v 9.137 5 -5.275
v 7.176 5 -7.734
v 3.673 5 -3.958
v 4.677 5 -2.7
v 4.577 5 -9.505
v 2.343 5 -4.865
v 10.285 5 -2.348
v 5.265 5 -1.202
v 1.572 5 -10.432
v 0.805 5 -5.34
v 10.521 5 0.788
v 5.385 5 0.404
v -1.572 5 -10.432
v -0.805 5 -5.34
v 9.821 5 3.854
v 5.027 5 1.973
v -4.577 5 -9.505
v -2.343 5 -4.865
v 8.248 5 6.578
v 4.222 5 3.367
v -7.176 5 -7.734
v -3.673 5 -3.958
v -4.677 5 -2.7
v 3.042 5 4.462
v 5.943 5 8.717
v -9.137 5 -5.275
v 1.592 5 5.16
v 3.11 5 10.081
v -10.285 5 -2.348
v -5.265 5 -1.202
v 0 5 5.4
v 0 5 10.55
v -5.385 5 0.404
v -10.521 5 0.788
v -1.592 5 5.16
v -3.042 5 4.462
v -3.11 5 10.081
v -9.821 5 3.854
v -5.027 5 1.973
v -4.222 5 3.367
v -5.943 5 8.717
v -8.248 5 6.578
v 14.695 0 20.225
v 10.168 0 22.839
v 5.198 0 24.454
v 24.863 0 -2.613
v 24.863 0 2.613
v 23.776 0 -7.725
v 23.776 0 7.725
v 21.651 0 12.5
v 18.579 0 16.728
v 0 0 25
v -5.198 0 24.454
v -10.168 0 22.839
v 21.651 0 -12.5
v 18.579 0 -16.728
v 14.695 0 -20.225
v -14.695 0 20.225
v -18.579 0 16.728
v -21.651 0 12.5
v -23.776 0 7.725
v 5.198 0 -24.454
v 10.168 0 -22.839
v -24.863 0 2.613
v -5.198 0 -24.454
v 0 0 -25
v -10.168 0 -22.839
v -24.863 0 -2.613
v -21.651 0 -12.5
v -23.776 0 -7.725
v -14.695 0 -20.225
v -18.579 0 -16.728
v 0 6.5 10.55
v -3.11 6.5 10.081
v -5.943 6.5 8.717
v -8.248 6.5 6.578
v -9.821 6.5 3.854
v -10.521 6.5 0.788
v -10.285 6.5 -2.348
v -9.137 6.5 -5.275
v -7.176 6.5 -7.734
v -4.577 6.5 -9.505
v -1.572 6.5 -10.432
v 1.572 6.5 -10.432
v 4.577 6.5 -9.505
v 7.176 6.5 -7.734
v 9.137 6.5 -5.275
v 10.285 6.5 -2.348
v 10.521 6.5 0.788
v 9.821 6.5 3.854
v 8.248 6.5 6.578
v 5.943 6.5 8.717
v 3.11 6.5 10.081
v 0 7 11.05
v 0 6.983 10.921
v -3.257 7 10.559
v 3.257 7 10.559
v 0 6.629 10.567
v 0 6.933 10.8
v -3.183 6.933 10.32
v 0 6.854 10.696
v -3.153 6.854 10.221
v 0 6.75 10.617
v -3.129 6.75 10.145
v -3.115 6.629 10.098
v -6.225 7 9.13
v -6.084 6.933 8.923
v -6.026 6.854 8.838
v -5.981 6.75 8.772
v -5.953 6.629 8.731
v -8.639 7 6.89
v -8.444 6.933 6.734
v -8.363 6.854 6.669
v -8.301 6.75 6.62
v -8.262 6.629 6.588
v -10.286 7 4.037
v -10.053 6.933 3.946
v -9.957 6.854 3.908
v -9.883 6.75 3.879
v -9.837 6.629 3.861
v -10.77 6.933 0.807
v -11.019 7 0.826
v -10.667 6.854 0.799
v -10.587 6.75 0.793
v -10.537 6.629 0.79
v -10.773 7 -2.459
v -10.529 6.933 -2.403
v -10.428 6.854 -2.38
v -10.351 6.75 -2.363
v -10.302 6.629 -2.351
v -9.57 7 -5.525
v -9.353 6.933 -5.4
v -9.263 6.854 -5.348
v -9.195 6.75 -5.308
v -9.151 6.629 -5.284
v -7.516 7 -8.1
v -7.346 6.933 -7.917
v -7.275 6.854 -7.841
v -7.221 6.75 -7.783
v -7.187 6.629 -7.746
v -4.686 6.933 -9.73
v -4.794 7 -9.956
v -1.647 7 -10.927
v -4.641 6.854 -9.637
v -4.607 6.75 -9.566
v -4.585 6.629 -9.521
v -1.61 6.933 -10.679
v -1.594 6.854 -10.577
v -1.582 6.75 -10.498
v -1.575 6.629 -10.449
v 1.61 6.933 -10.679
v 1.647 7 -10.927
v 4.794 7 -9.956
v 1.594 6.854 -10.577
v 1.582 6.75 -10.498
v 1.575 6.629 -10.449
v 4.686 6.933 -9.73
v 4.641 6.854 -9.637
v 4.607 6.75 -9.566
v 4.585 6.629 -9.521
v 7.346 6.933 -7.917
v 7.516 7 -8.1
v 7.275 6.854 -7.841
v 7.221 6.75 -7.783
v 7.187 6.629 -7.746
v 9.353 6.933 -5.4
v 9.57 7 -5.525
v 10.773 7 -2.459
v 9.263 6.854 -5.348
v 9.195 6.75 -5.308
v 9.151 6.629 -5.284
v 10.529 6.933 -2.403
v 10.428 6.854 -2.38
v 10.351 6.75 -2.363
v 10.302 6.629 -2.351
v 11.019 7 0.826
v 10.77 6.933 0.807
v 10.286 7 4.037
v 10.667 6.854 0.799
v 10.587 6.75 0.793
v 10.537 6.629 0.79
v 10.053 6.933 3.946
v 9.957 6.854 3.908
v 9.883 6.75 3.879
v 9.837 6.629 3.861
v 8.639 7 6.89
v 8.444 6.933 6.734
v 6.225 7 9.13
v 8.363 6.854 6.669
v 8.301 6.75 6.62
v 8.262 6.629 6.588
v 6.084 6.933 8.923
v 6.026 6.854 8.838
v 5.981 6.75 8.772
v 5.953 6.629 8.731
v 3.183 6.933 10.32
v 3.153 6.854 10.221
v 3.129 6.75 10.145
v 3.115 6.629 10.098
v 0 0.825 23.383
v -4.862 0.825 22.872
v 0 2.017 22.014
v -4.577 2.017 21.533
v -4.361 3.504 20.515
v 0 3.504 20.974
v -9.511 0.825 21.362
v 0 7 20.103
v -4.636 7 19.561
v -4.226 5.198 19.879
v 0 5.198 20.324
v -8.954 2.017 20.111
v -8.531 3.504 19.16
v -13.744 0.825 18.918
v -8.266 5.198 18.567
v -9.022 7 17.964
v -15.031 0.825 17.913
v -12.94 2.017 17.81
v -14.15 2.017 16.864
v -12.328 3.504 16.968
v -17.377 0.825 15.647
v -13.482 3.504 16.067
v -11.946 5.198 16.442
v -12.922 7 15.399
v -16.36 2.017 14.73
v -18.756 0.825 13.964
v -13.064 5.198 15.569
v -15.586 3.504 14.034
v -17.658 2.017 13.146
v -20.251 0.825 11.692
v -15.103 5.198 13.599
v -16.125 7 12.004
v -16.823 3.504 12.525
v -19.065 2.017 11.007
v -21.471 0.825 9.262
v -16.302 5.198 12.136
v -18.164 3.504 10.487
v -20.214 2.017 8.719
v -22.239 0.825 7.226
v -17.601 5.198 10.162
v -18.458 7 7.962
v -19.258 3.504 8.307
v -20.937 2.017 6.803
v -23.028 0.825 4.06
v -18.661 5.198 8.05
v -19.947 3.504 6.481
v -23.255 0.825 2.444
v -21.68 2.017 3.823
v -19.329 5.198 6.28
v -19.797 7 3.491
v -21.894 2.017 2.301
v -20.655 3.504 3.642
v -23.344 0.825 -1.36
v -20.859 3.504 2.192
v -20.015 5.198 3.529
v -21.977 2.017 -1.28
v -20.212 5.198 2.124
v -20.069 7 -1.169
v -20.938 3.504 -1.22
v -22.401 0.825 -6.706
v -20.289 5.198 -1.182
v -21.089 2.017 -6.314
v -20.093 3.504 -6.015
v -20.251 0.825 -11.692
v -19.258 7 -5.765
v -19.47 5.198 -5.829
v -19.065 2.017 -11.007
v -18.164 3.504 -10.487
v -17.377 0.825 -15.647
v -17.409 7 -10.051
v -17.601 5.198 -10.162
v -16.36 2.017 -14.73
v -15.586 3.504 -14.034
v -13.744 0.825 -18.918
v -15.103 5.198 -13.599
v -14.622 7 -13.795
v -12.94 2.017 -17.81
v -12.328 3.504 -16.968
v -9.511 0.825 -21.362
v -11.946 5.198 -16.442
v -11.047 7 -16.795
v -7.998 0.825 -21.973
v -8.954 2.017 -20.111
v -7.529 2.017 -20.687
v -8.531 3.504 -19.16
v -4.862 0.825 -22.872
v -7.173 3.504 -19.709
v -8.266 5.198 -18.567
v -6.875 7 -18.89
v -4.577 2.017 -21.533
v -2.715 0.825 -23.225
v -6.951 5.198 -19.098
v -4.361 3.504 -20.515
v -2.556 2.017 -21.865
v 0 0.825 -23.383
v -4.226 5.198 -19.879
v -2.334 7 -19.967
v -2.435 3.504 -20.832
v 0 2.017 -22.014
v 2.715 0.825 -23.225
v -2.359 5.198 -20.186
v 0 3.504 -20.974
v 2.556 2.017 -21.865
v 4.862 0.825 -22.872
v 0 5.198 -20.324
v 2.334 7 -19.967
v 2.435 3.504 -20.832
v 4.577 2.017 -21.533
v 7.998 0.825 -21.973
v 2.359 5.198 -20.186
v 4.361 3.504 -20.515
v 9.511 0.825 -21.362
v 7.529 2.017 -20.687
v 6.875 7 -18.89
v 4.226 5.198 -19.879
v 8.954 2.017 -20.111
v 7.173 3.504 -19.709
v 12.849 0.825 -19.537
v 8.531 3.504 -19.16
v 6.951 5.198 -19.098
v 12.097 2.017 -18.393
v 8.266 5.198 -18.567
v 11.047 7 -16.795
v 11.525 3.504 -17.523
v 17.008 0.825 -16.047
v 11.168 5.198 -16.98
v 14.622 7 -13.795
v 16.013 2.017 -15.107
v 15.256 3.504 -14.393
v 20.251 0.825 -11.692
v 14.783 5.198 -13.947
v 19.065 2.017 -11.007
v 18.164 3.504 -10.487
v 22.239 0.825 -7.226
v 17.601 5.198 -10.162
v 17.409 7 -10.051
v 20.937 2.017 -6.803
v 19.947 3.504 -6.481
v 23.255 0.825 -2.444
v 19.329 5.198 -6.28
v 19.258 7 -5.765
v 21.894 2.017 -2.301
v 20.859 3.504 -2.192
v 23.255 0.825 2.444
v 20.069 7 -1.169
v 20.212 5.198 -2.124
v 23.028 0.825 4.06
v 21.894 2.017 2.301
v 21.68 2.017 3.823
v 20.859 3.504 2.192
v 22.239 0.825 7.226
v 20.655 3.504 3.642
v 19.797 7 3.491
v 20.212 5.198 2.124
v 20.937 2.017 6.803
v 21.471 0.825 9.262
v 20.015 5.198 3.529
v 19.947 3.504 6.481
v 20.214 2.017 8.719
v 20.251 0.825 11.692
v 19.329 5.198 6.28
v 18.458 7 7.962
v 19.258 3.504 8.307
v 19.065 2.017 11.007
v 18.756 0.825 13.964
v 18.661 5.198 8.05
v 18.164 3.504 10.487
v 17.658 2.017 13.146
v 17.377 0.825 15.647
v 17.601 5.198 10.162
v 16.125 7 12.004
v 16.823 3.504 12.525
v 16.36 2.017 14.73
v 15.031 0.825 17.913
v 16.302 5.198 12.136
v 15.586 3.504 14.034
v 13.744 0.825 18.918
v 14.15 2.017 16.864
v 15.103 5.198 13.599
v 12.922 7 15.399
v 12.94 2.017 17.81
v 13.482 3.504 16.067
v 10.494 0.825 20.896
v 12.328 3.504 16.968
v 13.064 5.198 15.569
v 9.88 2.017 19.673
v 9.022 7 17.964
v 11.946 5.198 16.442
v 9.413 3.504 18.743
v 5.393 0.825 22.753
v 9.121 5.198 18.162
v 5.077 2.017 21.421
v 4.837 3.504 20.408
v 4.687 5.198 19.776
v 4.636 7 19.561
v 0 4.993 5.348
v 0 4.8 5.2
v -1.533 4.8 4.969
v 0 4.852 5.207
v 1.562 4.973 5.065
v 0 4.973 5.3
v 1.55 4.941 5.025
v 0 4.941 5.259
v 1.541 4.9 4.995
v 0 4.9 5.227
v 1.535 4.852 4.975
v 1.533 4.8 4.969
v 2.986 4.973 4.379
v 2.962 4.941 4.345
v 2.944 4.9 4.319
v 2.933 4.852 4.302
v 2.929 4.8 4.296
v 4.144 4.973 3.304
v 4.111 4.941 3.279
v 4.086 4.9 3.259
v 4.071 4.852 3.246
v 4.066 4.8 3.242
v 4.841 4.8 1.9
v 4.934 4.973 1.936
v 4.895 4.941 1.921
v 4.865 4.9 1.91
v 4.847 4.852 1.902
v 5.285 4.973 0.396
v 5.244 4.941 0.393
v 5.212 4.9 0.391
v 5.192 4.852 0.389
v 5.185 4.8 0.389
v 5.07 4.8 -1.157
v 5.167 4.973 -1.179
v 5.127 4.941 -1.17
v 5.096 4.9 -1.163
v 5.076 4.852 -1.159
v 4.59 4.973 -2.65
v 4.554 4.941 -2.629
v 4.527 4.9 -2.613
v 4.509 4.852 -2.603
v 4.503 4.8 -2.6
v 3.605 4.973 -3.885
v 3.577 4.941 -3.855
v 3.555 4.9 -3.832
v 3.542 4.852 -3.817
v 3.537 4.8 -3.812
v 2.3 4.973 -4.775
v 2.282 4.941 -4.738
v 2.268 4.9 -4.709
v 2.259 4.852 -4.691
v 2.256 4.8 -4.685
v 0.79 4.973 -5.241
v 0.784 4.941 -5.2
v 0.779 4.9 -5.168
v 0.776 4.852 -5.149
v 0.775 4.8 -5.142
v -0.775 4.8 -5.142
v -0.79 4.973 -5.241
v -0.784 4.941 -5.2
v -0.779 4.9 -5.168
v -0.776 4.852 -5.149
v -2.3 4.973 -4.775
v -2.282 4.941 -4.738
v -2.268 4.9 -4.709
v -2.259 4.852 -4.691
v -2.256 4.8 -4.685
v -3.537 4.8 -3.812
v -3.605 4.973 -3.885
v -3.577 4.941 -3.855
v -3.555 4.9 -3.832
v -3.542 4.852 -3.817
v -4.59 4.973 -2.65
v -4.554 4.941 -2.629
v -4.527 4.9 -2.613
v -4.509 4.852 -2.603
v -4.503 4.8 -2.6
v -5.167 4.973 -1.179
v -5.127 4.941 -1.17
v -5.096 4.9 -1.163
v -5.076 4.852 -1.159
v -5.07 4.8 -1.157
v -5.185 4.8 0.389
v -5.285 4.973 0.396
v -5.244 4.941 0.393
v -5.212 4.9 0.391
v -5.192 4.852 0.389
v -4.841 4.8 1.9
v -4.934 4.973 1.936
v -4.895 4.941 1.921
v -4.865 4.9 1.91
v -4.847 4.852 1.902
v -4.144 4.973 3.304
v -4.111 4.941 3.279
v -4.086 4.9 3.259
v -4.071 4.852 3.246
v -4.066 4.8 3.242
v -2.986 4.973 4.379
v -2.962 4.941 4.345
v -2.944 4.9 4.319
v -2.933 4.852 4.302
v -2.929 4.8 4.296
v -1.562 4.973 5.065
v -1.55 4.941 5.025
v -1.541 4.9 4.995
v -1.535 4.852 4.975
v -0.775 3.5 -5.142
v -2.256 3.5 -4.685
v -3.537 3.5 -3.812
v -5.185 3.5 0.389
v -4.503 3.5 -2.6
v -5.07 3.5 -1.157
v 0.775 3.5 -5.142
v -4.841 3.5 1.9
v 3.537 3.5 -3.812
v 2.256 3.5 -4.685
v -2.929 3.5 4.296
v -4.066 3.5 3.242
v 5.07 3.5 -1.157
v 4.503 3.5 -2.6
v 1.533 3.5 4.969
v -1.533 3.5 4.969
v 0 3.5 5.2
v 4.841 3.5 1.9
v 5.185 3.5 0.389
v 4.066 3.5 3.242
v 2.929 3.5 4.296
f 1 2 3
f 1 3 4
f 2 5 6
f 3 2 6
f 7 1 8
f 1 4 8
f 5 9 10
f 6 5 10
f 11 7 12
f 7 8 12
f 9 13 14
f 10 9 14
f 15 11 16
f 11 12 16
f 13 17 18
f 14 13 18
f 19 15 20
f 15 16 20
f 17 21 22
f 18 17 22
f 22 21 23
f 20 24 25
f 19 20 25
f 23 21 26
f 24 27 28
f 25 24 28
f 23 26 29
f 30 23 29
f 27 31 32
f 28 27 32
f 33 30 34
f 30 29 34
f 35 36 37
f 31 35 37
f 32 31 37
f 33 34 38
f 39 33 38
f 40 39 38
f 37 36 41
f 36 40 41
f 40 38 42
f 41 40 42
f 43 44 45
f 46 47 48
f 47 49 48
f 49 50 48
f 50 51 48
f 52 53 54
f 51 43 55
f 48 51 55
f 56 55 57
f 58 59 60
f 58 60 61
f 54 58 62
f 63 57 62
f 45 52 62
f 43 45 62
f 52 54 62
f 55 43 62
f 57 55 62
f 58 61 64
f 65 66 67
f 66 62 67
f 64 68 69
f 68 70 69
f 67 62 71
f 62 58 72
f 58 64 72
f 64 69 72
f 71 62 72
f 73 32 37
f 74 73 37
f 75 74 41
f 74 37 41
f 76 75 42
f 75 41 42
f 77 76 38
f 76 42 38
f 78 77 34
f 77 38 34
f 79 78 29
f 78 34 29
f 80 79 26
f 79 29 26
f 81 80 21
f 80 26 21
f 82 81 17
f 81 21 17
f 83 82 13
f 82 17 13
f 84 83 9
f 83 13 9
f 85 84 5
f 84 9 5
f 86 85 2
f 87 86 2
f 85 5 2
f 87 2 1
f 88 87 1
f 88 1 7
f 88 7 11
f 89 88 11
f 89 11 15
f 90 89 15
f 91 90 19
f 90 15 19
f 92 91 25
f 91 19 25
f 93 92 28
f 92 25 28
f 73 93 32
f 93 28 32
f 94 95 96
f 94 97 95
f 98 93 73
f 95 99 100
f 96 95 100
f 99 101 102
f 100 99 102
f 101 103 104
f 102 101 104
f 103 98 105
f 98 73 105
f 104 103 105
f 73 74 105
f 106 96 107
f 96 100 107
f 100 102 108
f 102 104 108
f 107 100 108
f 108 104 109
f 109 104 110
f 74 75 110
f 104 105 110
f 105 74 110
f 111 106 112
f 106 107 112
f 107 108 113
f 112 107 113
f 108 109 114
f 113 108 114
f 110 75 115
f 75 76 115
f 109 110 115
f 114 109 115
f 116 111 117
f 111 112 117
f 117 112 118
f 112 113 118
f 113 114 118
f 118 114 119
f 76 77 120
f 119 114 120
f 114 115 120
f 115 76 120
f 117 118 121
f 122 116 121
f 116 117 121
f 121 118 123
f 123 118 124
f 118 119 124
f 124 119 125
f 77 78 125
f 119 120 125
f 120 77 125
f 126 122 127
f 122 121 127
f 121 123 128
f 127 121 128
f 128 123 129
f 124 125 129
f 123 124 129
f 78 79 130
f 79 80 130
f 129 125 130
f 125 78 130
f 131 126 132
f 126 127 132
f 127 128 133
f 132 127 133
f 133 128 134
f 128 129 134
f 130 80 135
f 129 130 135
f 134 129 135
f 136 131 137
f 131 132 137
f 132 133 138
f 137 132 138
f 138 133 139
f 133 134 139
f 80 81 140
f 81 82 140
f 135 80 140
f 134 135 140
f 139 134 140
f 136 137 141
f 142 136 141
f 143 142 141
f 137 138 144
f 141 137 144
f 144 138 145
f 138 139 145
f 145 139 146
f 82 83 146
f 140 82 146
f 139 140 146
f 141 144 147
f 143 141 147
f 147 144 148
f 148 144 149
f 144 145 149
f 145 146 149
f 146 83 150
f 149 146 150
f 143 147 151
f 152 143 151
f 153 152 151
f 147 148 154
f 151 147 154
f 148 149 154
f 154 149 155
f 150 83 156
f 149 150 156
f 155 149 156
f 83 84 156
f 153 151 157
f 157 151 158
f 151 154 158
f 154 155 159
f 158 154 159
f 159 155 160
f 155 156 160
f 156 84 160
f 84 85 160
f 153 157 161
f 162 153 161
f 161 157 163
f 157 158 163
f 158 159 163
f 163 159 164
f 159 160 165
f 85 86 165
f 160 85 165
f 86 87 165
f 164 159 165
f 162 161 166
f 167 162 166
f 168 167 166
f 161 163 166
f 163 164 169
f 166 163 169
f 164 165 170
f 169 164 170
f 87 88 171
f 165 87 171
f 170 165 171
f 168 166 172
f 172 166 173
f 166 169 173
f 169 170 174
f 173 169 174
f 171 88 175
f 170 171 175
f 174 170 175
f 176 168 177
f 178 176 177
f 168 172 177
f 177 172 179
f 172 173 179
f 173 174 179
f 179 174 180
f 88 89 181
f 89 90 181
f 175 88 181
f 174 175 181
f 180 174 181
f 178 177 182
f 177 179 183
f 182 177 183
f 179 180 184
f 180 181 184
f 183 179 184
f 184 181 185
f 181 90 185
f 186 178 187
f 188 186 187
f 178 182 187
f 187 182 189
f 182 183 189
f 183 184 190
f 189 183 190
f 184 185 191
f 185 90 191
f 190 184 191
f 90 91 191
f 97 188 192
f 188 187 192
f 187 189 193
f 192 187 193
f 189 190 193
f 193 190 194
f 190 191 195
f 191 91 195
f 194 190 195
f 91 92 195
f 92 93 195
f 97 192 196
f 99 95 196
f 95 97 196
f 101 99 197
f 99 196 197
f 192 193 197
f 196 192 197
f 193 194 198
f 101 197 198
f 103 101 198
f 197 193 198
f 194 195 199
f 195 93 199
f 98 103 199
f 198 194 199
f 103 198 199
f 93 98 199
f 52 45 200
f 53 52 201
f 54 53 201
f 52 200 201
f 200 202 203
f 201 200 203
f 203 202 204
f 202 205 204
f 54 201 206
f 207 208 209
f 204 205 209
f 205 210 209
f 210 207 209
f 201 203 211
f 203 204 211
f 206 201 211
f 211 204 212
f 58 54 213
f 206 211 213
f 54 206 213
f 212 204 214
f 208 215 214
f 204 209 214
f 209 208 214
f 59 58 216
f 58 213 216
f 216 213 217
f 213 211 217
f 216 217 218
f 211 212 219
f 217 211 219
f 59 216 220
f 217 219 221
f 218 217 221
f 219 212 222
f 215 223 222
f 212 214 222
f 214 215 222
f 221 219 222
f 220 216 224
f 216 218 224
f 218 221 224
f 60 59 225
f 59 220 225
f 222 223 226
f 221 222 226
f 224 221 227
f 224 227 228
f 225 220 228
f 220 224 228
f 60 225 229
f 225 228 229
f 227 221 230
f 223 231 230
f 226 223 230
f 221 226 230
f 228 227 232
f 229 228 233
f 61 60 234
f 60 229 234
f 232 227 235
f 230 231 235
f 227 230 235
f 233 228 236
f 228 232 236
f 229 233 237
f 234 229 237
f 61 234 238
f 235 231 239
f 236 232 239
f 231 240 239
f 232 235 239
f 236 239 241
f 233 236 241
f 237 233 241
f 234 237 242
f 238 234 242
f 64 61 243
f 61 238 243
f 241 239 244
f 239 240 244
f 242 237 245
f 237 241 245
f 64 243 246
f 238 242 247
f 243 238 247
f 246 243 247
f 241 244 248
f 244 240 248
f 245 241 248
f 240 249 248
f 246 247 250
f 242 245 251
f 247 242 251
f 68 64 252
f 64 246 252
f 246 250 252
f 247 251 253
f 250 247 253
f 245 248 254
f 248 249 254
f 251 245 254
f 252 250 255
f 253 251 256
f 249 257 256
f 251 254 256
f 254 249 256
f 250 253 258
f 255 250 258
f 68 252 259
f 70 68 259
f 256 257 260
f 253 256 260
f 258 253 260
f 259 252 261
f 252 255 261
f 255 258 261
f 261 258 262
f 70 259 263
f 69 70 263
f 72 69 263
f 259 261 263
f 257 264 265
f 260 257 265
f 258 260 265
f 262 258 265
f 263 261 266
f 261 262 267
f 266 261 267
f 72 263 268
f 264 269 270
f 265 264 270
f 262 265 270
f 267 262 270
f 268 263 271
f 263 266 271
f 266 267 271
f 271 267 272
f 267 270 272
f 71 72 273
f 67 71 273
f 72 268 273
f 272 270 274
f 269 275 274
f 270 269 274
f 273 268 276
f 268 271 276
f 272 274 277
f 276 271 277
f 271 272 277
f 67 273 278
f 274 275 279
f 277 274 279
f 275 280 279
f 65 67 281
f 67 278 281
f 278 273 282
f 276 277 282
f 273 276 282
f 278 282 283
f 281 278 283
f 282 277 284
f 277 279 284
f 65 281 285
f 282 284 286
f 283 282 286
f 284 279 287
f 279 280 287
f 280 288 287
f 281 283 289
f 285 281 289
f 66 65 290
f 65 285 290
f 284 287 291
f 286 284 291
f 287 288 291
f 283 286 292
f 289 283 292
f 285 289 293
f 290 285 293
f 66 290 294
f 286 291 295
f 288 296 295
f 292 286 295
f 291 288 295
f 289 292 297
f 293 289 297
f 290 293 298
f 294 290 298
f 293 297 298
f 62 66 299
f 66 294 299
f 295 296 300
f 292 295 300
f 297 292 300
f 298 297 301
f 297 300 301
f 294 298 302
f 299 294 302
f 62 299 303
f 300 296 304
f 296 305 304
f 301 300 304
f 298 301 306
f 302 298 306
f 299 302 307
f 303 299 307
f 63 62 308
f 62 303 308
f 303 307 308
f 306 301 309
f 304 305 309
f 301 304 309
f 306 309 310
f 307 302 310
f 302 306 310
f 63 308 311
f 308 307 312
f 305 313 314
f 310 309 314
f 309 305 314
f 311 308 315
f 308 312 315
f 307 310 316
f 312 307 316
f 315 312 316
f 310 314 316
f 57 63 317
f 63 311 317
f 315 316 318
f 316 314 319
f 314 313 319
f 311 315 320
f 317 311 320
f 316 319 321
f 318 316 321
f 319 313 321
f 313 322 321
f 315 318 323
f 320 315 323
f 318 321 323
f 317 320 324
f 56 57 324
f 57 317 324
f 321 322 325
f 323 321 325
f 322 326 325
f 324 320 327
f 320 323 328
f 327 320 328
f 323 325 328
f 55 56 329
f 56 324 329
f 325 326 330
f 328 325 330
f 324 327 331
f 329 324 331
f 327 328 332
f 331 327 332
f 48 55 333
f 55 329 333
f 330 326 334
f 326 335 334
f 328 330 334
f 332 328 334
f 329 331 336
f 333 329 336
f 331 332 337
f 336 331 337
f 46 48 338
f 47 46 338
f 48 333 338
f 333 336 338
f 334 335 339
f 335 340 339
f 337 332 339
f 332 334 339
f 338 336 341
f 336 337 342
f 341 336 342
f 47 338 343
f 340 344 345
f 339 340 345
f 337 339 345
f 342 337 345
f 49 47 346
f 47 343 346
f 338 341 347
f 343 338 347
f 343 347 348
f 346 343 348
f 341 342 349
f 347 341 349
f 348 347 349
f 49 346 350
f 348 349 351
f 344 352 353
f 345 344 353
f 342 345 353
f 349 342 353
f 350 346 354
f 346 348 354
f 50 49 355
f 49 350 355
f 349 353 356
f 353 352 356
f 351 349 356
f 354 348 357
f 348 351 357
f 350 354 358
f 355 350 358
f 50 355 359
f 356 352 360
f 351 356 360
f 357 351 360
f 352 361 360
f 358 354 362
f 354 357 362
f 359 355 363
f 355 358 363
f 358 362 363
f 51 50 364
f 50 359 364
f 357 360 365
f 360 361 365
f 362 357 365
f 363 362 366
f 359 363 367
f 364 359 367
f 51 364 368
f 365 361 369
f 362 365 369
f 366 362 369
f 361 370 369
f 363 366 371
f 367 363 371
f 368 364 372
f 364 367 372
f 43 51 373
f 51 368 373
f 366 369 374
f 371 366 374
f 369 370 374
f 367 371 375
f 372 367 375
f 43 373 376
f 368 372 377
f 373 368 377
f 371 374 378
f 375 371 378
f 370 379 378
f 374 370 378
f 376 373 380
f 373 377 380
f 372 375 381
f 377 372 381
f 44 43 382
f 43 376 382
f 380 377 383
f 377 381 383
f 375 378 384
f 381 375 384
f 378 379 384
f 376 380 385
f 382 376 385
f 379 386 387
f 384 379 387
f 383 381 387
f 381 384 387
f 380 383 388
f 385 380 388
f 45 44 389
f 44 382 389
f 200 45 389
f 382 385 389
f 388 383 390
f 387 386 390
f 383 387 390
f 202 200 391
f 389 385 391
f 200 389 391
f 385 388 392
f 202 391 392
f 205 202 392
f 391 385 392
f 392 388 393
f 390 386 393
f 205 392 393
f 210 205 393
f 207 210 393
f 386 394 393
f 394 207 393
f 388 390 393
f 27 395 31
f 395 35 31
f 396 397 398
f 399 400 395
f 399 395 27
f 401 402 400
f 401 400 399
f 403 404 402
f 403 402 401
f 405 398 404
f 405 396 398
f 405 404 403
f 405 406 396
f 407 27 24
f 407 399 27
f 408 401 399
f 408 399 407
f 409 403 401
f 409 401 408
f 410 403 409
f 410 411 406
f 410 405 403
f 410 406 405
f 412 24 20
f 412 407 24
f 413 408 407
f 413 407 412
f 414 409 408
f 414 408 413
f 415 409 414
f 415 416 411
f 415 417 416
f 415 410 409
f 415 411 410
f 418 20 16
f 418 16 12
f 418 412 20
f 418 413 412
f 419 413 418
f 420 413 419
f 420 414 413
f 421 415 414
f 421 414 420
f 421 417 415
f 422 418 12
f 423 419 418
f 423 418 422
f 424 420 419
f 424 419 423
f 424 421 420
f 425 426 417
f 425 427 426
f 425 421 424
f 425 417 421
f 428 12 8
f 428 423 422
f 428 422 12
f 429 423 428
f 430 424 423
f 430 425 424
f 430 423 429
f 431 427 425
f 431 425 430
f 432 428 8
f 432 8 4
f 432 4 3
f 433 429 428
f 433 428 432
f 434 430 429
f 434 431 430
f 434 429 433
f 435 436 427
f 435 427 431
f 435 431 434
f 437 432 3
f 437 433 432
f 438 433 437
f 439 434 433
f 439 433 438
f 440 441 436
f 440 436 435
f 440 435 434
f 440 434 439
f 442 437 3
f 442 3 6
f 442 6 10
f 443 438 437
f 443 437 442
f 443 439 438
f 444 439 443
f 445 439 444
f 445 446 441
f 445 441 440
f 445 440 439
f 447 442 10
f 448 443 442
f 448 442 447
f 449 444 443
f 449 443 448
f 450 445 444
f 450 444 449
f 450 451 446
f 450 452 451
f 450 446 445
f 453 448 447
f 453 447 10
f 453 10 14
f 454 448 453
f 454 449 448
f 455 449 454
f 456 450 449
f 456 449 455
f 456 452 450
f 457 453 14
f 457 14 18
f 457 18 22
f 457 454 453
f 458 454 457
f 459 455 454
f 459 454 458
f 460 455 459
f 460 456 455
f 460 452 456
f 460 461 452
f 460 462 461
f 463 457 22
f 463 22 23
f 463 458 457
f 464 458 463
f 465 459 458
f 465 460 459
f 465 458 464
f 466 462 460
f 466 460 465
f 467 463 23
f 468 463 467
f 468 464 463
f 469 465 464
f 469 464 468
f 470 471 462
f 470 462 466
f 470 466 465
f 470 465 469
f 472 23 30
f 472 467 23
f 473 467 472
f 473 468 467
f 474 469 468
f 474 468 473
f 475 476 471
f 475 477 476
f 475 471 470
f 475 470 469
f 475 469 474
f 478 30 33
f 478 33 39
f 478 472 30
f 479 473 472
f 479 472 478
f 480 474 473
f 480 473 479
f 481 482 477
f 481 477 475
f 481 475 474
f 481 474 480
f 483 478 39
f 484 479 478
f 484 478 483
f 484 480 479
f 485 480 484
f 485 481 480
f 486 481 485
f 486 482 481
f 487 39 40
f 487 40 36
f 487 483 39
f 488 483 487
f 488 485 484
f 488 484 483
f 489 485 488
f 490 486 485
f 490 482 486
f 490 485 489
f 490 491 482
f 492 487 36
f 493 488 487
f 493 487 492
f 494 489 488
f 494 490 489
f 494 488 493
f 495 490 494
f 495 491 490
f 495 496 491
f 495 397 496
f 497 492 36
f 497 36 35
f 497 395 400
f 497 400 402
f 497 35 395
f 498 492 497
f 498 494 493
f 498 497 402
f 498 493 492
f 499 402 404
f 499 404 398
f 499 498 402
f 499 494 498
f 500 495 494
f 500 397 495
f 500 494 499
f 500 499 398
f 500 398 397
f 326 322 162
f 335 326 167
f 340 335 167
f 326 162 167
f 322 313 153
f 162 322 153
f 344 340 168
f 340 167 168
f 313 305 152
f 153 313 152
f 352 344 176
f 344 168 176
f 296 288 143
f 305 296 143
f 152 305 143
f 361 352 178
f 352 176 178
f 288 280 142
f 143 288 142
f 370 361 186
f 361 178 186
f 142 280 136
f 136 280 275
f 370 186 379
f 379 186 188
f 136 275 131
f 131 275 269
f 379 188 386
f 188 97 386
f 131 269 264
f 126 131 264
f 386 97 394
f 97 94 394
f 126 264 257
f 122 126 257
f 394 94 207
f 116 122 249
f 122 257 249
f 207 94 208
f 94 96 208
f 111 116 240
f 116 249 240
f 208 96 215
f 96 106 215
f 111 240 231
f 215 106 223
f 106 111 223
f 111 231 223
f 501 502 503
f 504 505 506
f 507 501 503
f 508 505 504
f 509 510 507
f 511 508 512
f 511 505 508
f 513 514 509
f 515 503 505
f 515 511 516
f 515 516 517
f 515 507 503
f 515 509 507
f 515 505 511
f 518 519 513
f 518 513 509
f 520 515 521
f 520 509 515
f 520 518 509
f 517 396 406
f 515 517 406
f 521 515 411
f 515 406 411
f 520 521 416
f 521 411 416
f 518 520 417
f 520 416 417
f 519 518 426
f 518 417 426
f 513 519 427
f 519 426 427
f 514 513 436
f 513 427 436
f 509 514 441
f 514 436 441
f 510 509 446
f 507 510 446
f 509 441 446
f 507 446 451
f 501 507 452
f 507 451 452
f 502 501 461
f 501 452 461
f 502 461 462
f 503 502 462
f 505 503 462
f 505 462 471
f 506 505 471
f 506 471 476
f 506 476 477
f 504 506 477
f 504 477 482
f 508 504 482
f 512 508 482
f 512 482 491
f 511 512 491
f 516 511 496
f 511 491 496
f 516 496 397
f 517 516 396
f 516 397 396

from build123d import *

# Parameters (mm, degrees)
FILLET1_R          = 0.5
SKETCH2_R          = 5.2
CUT_EXTRUDE1_DEPTH = 1.5
FILLET2_R          = 0.2


with BuildPart() as part:
    # Sketch1 → Revolve1 (revolve)
    with BuildSketch(Plane(origin=(0, 0, 0), x_dir=(0, 0, -1), z_dir=(1, 0, 0))):
        with BuildLine():
            Line((0, 0), (-25, 0))
            ThreePointArc((-25, 0), (-21.448462457, 2.728434409), (-20.102542457, 7))
            Line((-20.102542457, 7), (-10.55, 7))
            Line((-10.55, 7), (-10.55, 5))
            Line((-10.55, 5), (0, 5))
            Line((0, 5), (0, 0))
        make_face()
    revolve(axis=Axis((0, 5, 0), (0, -1, 0)))

    # Fillet1
    fillet1_edges = [part.edges().sort_by_distance(p)[0] for p in [
        (0, 7, -10.55),
    ]]
    fillet(fillet1_edges, radius=FILLET1_R)

    # Sketch2 → Cut-Extrude1 (cut)
    with BuildSketch(Plane(origin=(0, 5, 0), x_dir=(1, 0, 0), z_dir=(0, 1, 0))):
        with Locations(Location((0, 0, 0), (0, 0, 270))):
            Circle(SKETCH2_R)
    extrude(amount=-CUT_EXTRUDE1_DEPTH, mode=Mode.SUBTRACT)

    # Fillet2
    fillet2_edges = [part.edges().sort_by_distance(p)[0] for p in [
        (0, 5, -5.2),
    ]]
    fillet(fillet2_edges, radius=FILLET2_R)


solid = part.part
